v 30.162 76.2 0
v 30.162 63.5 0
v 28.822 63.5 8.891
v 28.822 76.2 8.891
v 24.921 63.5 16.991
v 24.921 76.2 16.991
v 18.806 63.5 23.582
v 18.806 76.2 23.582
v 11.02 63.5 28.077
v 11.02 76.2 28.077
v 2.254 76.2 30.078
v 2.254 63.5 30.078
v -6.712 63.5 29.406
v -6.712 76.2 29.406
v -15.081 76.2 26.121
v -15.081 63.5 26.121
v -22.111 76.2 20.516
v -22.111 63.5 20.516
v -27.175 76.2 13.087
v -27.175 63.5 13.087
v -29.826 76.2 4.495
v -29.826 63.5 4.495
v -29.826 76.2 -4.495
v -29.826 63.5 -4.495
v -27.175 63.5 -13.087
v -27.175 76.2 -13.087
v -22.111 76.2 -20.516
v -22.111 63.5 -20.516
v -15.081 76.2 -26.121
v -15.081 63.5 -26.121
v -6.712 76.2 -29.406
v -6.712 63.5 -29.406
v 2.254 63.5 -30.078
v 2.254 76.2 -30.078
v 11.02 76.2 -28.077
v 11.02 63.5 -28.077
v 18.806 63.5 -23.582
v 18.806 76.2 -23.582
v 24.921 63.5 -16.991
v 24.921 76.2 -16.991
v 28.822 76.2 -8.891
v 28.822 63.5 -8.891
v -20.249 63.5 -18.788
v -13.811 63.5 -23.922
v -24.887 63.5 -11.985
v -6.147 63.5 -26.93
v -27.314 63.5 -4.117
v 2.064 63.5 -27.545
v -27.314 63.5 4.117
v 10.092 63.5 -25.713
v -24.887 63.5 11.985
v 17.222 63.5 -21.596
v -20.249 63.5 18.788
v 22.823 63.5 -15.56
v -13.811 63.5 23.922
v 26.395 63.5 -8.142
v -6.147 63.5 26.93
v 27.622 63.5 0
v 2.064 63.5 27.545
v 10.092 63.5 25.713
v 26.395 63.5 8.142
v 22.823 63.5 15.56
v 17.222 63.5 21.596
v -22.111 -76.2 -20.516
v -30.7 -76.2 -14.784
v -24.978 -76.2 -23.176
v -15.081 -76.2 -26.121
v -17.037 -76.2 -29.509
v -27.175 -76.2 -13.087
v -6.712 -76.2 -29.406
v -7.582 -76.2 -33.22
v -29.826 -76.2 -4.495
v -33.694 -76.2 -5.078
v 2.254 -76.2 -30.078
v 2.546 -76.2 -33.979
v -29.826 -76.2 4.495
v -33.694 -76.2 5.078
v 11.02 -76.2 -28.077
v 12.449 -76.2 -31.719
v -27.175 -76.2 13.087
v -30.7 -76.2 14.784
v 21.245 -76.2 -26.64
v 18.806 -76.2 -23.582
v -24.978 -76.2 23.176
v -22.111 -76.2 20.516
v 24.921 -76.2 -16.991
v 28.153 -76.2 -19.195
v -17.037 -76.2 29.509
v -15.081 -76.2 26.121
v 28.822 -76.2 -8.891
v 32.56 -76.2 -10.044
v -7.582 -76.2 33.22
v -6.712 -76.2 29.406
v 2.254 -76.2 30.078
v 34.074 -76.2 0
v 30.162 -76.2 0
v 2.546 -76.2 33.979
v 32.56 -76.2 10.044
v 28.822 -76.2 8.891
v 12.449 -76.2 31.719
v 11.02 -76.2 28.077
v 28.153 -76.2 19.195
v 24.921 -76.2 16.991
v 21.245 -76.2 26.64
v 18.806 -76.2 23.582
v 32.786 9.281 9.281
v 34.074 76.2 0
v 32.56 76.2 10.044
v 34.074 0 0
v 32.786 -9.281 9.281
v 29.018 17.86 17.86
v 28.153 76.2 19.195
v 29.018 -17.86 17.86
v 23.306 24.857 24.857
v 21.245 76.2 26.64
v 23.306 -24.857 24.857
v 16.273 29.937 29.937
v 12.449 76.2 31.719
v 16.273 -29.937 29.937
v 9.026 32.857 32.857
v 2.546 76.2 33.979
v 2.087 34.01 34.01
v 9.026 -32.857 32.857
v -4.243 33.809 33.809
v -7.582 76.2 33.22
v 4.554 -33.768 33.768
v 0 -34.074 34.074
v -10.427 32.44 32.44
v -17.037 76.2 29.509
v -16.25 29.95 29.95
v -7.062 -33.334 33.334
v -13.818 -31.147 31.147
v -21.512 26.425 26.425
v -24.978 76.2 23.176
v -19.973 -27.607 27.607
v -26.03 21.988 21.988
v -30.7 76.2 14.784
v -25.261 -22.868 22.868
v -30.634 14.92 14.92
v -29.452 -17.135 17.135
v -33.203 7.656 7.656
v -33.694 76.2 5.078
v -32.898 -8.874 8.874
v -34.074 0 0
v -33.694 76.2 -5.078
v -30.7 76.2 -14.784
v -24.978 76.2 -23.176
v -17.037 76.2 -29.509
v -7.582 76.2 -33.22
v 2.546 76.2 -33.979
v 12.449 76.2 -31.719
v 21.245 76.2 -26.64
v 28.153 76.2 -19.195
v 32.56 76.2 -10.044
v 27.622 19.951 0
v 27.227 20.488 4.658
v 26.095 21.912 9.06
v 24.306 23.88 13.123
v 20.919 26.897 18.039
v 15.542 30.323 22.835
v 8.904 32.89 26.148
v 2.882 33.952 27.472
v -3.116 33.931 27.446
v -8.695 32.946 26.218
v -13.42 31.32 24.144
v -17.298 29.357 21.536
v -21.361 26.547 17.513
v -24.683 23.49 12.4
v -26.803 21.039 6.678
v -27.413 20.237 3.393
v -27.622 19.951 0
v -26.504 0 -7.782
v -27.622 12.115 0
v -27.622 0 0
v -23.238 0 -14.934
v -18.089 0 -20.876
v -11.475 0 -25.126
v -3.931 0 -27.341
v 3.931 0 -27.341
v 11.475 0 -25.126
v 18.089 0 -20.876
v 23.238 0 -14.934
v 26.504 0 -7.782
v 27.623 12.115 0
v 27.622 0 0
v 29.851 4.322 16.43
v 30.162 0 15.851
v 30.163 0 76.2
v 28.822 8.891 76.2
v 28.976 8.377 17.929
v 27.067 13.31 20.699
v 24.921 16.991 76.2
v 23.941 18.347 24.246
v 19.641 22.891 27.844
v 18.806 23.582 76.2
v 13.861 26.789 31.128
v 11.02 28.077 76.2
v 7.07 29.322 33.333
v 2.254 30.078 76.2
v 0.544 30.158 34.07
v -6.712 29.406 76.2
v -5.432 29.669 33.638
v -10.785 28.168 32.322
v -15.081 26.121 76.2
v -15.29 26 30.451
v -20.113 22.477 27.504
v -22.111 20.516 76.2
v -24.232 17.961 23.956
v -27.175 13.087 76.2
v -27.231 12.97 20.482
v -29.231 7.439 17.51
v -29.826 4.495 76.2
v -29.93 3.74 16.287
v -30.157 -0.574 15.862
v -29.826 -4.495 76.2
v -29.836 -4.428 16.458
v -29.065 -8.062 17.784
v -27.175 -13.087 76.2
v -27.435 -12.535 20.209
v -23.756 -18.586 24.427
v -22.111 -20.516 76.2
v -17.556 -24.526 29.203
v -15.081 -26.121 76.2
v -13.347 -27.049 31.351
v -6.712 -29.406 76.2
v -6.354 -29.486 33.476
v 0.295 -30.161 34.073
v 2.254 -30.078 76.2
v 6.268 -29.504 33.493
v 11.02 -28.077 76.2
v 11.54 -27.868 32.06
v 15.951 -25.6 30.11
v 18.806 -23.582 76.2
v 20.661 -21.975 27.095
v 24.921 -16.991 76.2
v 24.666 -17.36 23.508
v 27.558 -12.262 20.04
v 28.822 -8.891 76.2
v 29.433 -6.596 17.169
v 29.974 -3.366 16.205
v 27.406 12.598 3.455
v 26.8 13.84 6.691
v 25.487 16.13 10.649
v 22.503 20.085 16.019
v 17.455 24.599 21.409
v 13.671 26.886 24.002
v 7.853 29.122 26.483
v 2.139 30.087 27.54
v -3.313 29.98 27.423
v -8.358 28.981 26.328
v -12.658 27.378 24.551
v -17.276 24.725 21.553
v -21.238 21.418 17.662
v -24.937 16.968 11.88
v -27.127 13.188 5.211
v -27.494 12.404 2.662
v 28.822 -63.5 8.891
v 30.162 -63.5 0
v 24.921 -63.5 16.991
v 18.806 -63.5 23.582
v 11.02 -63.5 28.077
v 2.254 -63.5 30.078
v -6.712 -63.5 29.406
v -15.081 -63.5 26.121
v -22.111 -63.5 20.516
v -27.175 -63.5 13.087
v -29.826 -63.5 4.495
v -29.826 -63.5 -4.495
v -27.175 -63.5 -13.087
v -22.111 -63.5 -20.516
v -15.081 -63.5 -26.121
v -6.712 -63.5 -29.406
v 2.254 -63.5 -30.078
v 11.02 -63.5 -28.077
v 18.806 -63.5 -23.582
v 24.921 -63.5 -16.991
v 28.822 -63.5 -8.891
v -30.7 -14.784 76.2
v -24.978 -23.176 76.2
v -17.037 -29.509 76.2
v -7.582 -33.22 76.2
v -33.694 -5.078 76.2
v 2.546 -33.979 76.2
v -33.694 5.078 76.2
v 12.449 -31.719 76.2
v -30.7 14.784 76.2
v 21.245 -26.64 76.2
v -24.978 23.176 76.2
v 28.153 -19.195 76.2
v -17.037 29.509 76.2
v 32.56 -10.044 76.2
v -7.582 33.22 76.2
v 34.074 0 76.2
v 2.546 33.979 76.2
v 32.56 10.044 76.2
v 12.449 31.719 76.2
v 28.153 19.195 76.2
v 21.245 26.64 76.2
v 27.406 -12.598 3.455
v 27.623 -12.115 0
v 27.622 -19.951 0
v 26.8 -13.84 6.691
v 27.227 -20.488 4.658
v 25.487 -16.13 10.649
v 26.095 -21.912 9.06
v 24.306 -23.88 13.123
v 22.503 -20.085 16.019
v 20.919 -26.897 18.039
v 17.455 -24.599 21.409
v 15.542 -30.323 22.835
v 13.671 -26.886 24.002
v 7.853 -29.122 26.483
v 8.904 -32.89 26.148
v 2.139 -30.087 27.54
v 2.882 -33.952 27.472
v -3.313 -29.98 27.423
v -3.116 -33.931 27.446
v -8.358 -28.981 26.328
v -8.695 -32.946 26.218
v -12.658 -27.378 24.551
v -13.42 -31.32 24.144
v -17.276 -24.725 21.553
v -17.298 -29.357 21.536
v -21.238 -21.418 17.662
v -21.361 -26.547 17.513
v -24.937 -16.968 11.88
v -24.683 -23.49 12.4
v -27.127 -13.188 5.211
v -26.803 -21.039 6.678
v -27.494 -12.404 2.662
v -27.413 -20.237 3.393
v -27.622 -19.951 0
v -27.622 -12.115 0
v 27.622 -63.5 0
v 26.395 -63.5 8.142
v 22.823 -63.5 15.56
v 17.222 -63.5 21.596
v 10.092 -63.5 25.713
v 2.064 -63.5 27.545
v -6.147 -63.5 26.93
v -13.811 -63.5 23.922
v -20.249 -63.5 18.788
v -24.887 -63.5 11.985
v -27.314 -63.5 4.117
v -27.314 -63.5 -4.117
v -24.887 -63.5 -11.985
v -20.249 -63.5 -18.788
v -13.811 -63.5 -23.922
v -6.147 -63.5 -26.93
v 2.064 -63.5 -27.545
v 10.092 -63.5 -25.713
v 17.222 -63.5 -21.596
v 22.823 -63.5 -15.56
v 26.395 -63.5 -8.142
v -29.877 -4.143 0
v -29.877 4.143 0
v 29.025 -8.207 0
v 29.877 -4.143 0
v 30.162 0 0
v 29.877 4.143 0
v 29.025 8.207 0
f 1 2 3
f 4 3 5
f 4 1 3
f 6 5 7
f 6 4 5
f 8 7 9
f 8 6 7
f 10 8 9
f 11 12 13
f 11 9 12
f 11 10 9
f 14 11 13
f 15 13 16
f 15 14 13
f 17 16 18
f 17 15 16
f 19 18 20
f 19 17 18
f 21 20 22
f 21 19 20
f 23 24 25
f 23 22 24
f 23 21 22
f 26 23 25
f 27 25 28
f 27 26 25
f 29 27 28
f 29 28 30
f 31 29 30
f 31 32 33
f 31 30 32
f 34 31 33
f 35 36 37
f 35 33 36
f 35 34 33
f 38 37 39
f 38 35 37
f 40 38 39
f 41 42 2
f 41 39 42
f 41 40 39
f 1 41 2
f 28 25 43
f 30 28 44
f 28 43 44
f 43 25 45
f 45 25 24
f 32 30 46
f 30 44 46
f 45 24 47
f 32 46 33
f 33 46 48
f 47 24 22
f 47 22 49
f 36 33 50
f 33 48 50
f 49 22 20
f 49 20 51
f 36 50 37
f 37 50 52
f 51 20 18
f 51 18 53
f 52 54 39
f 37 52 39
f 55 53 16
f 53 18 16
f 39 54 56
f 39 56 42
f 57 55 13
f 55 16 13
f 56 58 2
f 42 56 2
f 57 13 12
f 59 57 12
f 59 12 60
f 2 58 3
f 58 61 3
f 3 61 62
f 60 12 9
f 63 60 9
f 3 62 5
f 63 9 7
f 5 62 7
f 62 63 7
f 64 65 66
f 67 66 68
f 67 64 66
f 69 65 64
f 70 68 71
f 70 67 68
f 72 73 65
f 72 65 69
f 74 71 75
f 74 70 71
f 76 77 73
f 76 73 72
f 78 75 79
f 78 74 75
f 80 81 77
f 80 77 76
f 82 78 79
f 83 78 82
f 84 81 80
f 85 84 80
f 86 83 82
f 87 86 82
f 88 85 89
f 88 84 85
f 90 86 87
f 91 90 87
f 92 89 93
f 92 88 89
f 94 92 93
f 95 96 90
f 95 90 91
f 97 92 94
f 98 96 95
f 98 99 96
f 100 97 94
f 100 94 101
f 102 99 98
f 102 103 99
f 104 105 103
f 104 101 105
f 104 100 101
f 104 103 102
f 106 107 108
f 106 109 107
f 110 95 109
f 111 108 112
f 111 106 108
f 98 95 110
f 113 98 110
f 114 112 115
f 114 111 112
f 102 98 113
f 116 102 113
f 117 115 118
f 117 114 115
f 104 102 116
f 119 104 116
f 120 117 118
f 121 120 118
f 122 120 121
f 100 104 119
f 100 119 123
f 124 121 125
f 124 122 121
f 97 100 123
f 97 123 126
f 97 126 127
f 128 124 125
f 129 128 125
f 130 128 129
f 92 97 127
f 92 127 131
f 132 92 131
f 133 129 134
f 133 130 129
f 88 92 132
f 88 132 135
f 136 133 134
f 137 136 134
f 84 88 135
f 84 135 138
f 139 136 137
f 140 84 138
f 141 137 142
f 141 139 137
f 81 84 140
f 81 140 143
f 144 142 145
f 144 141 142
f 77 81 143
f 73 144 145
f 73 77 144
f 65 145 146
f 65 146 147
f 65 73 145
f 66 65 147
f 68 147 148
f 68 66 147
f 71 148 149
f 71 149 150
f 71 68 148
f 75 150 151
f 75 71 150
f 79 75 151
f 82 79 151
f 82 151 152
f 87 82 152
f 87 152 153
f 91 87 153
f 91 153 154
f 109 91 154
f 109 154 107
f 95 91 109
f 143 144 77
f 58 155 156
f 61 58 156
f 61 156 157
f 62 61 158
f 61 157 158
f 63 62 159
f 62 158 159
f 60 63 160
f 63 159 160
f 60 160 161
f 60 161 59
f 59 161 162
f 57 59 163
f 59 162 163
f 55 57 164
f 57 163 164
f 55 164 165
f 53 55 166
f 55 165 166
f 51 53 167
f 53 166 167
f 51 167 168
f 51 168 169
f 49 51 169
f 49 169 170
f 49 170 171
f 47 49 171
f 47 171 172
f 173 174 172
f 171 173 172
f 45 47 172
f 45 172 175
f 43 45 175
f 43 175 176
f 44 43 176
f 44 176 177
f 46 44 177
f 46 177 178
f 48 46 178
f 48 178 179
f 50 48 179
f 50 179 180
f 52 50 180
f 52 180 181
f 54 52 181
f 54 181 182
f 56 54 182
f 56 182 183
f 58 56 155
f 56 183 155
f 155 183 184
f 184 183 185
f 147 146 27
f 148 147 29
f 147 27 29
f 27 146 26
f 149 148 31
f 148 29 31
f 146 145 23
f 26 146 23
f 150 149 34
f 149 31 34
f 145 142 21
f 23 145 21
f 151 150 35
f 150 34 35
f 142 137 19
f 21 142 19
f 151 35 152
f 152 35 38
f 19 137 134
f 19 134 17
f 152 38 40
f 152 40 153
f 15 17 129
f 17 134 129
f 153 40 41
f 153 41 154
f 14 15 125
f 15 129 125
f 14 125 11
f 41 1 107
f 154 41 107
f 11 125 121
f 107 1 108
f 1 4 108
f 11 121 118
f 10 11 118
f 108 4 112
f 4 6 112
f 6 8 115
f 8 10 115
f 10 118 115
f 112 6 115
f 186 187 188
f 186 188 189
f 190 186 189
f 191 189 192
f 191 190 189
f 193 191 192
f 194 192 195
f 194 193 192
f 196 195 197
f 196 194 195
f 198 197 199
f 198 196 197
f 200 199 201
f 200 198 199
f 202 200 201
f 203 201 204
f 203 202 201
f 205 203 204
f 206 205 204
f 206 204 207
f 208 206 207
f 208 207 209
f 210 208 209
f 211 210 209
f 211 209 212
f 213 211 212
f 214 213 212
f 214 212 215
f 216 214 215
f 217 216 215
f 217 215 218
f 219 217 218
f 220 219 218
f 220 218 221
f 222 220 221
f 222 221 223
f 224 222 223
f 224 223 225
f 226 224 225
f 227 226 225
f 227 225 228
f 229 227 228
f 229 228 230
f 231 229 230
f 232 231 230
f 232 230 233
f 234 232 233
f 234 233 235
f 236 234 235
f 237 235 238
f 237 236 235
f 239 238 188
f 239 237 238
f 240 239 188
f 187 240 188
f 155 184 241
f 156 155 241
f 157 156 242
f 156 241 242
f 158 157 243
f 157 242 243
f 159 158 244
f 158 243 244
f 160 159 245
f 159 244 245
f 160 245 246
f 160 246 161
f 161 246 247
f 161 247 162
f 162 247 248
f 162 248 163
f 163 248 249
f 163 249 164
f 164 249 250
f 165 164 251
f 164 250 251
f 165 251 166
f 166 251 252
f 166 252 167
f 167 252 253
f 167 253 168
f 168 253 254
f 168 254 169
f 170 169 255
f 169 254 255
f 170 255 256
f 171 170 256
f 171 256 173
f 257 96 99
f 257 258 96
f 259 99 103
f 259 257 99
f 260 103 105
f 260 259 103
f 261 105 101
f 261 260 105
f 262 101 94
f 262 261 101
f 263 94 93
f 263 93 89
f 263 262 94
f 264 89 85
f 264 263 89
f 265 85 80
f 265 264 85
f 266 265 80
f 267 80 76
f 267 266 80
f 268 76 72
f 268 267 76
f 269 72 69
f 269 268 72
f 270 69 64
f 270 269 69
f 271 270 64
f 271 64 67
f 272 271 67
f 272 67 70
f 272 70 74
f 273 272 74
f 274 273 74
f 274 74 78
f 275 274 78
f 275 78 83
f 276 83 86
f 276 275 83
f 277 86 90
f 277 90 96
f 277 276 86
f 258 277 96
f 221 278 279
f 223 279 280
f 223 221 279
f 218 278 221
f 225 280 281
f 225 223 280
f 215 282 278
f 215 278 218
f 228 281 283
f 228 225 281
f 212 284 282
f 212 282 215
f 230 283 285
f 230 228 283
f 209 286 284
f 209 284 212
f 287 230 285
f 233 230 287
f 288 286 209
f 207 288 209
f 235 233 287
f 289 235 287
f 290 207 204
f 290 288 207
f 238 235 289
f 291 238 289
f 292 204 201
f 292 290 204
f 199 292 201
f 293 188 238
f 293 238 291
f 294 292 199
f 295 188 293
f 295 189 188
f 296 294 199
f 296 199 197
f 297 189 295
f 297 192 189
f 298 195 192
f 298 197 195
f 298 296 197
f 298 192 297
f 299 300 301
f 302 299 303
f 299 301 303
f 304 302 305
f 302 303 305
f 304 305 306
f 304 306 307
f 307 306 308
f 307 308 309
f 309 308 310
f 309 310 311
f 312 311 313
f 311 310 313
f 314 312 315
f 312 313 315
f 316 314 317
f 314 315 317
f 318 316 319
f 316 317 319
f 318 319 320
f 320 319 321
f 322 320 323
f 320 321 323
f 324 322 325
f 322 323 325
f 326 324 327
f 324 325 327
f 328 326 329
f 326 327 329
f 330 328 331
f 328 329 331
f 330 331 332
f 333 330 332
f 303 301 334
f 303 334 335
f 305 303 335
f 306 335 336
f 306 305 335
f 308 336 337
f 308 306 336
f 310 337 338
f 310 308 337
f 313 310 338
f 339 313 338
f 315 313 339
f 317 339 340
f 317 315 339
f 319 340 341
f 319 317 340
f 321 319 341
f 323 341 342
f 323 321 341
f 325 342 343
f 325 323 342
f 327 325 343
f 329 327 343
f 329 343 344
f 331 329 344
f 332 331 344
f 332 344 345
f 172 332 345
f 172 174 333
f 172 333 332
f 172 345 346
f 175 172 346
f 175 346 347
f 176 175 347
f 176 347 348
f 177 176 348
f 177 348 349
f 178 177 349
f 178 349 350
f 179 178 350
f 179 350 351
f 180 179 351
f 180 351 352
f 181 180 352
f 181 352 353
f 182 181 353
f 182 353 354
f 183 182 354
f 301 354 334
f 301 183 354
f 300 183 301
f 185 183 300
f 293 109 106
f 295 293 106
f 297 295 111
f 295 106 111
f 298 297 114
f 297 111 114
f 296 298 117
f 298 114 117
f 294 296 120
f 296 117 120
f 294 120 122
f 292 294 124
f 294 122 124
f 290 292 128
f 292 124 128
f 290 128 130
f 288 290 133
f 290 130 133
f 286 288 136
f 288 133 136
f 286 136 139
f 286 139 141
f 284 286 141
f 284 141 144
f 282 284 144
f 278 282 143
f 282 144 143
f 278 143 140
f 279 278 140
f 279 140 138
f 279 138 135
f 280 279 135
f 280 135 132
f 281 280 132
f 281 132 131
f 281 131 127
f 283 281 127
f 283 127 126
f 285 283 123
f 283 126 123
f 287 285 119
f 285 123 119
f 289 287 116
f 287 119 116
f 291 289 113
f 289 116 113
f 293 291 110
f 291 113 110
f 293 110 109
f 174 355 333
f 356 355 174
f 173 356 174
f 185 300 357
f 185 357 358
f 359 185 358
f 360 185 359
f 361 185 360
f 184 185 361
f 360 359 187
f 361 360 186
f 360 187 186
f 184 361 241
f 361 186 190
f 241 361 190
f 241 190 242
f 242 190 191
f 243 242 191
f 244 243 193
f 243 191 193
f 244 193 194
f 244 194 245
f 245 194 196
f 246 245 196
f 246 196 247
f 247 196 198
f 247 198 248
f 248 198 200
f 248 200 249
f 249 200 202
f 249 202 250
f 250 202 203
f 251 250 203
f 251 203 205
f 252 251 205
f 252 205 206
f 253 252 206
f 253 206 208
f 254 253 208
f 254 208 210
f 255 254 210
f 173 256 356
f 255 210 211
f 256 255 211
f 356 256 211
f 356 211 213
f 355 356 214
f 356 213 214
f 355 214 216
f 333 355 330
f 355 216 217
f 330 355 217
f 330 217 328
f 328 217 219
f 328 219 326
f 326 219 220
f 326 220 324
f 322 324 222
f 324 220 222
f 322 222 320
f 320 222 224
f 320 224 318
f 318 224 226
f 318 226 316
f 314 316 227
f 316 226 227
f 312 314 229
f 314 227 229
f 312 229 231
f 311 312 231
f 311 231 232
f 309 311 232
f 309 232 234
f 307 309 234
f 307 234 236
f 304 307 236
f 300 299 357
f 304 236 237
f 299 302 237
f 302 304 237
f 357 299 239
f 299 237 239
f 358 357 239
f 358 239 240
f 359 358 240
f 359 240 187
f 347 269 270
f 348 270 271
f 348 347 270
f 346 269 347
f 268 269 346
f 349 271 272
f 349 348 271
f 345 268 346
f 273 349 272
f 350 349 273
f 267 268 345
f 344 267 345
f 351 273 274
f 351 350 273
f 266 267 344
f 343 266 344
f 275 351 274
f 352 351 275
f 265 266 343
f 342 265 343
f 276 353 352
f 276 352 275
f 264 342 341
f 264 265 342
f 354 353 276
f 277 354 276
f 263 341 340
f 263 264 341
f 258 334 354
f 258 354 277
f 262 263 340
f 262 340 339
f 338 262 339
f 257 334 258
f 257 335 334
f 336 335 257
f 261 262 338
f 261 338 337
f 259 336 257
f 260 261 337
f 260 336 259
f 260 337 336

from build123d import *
from build123d import SkipClean  # not in build123d's __all__

# Parameters (mm, degrees)
F0_R     = 34.0741
F0_R_2   = 30.1625
F1_DEPTH = 76.2
F2_R     = 34.0741
F2_R_2   = 30.1625
F3_DEPTH = 76.2
F4_R     = 34.0741
F4_R_2   = 27.6225
F5_DEPTH = 63.5
F6_R     = 30.1625
F7_DEPTH = 76.2
F8_R     = 27.6225
F9_DEPTH = 143.6


with BuildPart() as f1:
    # F0 (on Front) → F1 (new body, symmetric)
    with BuildSketch(Plane.XZ):
        Circle(F0_R)
        Circle(F0_R_2, mode=Mode.SUBTRACT)
    extrude(amount=F1_DEPTH, both=True)

    # F2 (on Top) → F3 (join)
    with BuildSketch(Plane.XY):
        Circle(F2_R)
        Circle(F2_R_2, mode=Mode.SUBTRACT)
    extrude(amount=F3_DEPTH)

    # F4 (on Front) → F5 (join, symmetric)
    with BuildSketch(Plane.XZ):
        Circle(F4_R)
        Circle(F4_R_2, mode=Mode.SUBTRACT)
    with SkipClean():  # cleaning this boolean's faces spoils the solid; the shape is the same uncleaned
        extrude(amount=F5_DEPTH, both=True)

    # F6 (on face) → F7 (cut, through all)
    with BuildSketch(Plane.XY.offset(76.2)):
        Circle(F6_R)
    extrude(amount=-F7_DEPTH, mode=Mode.SUBTRACT)

    # F8 (on Front) → F9 (cut, symmetric)
    with BuildSketch(Plane.XZ):
        Circle(F8_R)
    extrude(amount=F9_DEPTH, both=True, mode=Mode.SUBTRACT)


solid = f1.part
